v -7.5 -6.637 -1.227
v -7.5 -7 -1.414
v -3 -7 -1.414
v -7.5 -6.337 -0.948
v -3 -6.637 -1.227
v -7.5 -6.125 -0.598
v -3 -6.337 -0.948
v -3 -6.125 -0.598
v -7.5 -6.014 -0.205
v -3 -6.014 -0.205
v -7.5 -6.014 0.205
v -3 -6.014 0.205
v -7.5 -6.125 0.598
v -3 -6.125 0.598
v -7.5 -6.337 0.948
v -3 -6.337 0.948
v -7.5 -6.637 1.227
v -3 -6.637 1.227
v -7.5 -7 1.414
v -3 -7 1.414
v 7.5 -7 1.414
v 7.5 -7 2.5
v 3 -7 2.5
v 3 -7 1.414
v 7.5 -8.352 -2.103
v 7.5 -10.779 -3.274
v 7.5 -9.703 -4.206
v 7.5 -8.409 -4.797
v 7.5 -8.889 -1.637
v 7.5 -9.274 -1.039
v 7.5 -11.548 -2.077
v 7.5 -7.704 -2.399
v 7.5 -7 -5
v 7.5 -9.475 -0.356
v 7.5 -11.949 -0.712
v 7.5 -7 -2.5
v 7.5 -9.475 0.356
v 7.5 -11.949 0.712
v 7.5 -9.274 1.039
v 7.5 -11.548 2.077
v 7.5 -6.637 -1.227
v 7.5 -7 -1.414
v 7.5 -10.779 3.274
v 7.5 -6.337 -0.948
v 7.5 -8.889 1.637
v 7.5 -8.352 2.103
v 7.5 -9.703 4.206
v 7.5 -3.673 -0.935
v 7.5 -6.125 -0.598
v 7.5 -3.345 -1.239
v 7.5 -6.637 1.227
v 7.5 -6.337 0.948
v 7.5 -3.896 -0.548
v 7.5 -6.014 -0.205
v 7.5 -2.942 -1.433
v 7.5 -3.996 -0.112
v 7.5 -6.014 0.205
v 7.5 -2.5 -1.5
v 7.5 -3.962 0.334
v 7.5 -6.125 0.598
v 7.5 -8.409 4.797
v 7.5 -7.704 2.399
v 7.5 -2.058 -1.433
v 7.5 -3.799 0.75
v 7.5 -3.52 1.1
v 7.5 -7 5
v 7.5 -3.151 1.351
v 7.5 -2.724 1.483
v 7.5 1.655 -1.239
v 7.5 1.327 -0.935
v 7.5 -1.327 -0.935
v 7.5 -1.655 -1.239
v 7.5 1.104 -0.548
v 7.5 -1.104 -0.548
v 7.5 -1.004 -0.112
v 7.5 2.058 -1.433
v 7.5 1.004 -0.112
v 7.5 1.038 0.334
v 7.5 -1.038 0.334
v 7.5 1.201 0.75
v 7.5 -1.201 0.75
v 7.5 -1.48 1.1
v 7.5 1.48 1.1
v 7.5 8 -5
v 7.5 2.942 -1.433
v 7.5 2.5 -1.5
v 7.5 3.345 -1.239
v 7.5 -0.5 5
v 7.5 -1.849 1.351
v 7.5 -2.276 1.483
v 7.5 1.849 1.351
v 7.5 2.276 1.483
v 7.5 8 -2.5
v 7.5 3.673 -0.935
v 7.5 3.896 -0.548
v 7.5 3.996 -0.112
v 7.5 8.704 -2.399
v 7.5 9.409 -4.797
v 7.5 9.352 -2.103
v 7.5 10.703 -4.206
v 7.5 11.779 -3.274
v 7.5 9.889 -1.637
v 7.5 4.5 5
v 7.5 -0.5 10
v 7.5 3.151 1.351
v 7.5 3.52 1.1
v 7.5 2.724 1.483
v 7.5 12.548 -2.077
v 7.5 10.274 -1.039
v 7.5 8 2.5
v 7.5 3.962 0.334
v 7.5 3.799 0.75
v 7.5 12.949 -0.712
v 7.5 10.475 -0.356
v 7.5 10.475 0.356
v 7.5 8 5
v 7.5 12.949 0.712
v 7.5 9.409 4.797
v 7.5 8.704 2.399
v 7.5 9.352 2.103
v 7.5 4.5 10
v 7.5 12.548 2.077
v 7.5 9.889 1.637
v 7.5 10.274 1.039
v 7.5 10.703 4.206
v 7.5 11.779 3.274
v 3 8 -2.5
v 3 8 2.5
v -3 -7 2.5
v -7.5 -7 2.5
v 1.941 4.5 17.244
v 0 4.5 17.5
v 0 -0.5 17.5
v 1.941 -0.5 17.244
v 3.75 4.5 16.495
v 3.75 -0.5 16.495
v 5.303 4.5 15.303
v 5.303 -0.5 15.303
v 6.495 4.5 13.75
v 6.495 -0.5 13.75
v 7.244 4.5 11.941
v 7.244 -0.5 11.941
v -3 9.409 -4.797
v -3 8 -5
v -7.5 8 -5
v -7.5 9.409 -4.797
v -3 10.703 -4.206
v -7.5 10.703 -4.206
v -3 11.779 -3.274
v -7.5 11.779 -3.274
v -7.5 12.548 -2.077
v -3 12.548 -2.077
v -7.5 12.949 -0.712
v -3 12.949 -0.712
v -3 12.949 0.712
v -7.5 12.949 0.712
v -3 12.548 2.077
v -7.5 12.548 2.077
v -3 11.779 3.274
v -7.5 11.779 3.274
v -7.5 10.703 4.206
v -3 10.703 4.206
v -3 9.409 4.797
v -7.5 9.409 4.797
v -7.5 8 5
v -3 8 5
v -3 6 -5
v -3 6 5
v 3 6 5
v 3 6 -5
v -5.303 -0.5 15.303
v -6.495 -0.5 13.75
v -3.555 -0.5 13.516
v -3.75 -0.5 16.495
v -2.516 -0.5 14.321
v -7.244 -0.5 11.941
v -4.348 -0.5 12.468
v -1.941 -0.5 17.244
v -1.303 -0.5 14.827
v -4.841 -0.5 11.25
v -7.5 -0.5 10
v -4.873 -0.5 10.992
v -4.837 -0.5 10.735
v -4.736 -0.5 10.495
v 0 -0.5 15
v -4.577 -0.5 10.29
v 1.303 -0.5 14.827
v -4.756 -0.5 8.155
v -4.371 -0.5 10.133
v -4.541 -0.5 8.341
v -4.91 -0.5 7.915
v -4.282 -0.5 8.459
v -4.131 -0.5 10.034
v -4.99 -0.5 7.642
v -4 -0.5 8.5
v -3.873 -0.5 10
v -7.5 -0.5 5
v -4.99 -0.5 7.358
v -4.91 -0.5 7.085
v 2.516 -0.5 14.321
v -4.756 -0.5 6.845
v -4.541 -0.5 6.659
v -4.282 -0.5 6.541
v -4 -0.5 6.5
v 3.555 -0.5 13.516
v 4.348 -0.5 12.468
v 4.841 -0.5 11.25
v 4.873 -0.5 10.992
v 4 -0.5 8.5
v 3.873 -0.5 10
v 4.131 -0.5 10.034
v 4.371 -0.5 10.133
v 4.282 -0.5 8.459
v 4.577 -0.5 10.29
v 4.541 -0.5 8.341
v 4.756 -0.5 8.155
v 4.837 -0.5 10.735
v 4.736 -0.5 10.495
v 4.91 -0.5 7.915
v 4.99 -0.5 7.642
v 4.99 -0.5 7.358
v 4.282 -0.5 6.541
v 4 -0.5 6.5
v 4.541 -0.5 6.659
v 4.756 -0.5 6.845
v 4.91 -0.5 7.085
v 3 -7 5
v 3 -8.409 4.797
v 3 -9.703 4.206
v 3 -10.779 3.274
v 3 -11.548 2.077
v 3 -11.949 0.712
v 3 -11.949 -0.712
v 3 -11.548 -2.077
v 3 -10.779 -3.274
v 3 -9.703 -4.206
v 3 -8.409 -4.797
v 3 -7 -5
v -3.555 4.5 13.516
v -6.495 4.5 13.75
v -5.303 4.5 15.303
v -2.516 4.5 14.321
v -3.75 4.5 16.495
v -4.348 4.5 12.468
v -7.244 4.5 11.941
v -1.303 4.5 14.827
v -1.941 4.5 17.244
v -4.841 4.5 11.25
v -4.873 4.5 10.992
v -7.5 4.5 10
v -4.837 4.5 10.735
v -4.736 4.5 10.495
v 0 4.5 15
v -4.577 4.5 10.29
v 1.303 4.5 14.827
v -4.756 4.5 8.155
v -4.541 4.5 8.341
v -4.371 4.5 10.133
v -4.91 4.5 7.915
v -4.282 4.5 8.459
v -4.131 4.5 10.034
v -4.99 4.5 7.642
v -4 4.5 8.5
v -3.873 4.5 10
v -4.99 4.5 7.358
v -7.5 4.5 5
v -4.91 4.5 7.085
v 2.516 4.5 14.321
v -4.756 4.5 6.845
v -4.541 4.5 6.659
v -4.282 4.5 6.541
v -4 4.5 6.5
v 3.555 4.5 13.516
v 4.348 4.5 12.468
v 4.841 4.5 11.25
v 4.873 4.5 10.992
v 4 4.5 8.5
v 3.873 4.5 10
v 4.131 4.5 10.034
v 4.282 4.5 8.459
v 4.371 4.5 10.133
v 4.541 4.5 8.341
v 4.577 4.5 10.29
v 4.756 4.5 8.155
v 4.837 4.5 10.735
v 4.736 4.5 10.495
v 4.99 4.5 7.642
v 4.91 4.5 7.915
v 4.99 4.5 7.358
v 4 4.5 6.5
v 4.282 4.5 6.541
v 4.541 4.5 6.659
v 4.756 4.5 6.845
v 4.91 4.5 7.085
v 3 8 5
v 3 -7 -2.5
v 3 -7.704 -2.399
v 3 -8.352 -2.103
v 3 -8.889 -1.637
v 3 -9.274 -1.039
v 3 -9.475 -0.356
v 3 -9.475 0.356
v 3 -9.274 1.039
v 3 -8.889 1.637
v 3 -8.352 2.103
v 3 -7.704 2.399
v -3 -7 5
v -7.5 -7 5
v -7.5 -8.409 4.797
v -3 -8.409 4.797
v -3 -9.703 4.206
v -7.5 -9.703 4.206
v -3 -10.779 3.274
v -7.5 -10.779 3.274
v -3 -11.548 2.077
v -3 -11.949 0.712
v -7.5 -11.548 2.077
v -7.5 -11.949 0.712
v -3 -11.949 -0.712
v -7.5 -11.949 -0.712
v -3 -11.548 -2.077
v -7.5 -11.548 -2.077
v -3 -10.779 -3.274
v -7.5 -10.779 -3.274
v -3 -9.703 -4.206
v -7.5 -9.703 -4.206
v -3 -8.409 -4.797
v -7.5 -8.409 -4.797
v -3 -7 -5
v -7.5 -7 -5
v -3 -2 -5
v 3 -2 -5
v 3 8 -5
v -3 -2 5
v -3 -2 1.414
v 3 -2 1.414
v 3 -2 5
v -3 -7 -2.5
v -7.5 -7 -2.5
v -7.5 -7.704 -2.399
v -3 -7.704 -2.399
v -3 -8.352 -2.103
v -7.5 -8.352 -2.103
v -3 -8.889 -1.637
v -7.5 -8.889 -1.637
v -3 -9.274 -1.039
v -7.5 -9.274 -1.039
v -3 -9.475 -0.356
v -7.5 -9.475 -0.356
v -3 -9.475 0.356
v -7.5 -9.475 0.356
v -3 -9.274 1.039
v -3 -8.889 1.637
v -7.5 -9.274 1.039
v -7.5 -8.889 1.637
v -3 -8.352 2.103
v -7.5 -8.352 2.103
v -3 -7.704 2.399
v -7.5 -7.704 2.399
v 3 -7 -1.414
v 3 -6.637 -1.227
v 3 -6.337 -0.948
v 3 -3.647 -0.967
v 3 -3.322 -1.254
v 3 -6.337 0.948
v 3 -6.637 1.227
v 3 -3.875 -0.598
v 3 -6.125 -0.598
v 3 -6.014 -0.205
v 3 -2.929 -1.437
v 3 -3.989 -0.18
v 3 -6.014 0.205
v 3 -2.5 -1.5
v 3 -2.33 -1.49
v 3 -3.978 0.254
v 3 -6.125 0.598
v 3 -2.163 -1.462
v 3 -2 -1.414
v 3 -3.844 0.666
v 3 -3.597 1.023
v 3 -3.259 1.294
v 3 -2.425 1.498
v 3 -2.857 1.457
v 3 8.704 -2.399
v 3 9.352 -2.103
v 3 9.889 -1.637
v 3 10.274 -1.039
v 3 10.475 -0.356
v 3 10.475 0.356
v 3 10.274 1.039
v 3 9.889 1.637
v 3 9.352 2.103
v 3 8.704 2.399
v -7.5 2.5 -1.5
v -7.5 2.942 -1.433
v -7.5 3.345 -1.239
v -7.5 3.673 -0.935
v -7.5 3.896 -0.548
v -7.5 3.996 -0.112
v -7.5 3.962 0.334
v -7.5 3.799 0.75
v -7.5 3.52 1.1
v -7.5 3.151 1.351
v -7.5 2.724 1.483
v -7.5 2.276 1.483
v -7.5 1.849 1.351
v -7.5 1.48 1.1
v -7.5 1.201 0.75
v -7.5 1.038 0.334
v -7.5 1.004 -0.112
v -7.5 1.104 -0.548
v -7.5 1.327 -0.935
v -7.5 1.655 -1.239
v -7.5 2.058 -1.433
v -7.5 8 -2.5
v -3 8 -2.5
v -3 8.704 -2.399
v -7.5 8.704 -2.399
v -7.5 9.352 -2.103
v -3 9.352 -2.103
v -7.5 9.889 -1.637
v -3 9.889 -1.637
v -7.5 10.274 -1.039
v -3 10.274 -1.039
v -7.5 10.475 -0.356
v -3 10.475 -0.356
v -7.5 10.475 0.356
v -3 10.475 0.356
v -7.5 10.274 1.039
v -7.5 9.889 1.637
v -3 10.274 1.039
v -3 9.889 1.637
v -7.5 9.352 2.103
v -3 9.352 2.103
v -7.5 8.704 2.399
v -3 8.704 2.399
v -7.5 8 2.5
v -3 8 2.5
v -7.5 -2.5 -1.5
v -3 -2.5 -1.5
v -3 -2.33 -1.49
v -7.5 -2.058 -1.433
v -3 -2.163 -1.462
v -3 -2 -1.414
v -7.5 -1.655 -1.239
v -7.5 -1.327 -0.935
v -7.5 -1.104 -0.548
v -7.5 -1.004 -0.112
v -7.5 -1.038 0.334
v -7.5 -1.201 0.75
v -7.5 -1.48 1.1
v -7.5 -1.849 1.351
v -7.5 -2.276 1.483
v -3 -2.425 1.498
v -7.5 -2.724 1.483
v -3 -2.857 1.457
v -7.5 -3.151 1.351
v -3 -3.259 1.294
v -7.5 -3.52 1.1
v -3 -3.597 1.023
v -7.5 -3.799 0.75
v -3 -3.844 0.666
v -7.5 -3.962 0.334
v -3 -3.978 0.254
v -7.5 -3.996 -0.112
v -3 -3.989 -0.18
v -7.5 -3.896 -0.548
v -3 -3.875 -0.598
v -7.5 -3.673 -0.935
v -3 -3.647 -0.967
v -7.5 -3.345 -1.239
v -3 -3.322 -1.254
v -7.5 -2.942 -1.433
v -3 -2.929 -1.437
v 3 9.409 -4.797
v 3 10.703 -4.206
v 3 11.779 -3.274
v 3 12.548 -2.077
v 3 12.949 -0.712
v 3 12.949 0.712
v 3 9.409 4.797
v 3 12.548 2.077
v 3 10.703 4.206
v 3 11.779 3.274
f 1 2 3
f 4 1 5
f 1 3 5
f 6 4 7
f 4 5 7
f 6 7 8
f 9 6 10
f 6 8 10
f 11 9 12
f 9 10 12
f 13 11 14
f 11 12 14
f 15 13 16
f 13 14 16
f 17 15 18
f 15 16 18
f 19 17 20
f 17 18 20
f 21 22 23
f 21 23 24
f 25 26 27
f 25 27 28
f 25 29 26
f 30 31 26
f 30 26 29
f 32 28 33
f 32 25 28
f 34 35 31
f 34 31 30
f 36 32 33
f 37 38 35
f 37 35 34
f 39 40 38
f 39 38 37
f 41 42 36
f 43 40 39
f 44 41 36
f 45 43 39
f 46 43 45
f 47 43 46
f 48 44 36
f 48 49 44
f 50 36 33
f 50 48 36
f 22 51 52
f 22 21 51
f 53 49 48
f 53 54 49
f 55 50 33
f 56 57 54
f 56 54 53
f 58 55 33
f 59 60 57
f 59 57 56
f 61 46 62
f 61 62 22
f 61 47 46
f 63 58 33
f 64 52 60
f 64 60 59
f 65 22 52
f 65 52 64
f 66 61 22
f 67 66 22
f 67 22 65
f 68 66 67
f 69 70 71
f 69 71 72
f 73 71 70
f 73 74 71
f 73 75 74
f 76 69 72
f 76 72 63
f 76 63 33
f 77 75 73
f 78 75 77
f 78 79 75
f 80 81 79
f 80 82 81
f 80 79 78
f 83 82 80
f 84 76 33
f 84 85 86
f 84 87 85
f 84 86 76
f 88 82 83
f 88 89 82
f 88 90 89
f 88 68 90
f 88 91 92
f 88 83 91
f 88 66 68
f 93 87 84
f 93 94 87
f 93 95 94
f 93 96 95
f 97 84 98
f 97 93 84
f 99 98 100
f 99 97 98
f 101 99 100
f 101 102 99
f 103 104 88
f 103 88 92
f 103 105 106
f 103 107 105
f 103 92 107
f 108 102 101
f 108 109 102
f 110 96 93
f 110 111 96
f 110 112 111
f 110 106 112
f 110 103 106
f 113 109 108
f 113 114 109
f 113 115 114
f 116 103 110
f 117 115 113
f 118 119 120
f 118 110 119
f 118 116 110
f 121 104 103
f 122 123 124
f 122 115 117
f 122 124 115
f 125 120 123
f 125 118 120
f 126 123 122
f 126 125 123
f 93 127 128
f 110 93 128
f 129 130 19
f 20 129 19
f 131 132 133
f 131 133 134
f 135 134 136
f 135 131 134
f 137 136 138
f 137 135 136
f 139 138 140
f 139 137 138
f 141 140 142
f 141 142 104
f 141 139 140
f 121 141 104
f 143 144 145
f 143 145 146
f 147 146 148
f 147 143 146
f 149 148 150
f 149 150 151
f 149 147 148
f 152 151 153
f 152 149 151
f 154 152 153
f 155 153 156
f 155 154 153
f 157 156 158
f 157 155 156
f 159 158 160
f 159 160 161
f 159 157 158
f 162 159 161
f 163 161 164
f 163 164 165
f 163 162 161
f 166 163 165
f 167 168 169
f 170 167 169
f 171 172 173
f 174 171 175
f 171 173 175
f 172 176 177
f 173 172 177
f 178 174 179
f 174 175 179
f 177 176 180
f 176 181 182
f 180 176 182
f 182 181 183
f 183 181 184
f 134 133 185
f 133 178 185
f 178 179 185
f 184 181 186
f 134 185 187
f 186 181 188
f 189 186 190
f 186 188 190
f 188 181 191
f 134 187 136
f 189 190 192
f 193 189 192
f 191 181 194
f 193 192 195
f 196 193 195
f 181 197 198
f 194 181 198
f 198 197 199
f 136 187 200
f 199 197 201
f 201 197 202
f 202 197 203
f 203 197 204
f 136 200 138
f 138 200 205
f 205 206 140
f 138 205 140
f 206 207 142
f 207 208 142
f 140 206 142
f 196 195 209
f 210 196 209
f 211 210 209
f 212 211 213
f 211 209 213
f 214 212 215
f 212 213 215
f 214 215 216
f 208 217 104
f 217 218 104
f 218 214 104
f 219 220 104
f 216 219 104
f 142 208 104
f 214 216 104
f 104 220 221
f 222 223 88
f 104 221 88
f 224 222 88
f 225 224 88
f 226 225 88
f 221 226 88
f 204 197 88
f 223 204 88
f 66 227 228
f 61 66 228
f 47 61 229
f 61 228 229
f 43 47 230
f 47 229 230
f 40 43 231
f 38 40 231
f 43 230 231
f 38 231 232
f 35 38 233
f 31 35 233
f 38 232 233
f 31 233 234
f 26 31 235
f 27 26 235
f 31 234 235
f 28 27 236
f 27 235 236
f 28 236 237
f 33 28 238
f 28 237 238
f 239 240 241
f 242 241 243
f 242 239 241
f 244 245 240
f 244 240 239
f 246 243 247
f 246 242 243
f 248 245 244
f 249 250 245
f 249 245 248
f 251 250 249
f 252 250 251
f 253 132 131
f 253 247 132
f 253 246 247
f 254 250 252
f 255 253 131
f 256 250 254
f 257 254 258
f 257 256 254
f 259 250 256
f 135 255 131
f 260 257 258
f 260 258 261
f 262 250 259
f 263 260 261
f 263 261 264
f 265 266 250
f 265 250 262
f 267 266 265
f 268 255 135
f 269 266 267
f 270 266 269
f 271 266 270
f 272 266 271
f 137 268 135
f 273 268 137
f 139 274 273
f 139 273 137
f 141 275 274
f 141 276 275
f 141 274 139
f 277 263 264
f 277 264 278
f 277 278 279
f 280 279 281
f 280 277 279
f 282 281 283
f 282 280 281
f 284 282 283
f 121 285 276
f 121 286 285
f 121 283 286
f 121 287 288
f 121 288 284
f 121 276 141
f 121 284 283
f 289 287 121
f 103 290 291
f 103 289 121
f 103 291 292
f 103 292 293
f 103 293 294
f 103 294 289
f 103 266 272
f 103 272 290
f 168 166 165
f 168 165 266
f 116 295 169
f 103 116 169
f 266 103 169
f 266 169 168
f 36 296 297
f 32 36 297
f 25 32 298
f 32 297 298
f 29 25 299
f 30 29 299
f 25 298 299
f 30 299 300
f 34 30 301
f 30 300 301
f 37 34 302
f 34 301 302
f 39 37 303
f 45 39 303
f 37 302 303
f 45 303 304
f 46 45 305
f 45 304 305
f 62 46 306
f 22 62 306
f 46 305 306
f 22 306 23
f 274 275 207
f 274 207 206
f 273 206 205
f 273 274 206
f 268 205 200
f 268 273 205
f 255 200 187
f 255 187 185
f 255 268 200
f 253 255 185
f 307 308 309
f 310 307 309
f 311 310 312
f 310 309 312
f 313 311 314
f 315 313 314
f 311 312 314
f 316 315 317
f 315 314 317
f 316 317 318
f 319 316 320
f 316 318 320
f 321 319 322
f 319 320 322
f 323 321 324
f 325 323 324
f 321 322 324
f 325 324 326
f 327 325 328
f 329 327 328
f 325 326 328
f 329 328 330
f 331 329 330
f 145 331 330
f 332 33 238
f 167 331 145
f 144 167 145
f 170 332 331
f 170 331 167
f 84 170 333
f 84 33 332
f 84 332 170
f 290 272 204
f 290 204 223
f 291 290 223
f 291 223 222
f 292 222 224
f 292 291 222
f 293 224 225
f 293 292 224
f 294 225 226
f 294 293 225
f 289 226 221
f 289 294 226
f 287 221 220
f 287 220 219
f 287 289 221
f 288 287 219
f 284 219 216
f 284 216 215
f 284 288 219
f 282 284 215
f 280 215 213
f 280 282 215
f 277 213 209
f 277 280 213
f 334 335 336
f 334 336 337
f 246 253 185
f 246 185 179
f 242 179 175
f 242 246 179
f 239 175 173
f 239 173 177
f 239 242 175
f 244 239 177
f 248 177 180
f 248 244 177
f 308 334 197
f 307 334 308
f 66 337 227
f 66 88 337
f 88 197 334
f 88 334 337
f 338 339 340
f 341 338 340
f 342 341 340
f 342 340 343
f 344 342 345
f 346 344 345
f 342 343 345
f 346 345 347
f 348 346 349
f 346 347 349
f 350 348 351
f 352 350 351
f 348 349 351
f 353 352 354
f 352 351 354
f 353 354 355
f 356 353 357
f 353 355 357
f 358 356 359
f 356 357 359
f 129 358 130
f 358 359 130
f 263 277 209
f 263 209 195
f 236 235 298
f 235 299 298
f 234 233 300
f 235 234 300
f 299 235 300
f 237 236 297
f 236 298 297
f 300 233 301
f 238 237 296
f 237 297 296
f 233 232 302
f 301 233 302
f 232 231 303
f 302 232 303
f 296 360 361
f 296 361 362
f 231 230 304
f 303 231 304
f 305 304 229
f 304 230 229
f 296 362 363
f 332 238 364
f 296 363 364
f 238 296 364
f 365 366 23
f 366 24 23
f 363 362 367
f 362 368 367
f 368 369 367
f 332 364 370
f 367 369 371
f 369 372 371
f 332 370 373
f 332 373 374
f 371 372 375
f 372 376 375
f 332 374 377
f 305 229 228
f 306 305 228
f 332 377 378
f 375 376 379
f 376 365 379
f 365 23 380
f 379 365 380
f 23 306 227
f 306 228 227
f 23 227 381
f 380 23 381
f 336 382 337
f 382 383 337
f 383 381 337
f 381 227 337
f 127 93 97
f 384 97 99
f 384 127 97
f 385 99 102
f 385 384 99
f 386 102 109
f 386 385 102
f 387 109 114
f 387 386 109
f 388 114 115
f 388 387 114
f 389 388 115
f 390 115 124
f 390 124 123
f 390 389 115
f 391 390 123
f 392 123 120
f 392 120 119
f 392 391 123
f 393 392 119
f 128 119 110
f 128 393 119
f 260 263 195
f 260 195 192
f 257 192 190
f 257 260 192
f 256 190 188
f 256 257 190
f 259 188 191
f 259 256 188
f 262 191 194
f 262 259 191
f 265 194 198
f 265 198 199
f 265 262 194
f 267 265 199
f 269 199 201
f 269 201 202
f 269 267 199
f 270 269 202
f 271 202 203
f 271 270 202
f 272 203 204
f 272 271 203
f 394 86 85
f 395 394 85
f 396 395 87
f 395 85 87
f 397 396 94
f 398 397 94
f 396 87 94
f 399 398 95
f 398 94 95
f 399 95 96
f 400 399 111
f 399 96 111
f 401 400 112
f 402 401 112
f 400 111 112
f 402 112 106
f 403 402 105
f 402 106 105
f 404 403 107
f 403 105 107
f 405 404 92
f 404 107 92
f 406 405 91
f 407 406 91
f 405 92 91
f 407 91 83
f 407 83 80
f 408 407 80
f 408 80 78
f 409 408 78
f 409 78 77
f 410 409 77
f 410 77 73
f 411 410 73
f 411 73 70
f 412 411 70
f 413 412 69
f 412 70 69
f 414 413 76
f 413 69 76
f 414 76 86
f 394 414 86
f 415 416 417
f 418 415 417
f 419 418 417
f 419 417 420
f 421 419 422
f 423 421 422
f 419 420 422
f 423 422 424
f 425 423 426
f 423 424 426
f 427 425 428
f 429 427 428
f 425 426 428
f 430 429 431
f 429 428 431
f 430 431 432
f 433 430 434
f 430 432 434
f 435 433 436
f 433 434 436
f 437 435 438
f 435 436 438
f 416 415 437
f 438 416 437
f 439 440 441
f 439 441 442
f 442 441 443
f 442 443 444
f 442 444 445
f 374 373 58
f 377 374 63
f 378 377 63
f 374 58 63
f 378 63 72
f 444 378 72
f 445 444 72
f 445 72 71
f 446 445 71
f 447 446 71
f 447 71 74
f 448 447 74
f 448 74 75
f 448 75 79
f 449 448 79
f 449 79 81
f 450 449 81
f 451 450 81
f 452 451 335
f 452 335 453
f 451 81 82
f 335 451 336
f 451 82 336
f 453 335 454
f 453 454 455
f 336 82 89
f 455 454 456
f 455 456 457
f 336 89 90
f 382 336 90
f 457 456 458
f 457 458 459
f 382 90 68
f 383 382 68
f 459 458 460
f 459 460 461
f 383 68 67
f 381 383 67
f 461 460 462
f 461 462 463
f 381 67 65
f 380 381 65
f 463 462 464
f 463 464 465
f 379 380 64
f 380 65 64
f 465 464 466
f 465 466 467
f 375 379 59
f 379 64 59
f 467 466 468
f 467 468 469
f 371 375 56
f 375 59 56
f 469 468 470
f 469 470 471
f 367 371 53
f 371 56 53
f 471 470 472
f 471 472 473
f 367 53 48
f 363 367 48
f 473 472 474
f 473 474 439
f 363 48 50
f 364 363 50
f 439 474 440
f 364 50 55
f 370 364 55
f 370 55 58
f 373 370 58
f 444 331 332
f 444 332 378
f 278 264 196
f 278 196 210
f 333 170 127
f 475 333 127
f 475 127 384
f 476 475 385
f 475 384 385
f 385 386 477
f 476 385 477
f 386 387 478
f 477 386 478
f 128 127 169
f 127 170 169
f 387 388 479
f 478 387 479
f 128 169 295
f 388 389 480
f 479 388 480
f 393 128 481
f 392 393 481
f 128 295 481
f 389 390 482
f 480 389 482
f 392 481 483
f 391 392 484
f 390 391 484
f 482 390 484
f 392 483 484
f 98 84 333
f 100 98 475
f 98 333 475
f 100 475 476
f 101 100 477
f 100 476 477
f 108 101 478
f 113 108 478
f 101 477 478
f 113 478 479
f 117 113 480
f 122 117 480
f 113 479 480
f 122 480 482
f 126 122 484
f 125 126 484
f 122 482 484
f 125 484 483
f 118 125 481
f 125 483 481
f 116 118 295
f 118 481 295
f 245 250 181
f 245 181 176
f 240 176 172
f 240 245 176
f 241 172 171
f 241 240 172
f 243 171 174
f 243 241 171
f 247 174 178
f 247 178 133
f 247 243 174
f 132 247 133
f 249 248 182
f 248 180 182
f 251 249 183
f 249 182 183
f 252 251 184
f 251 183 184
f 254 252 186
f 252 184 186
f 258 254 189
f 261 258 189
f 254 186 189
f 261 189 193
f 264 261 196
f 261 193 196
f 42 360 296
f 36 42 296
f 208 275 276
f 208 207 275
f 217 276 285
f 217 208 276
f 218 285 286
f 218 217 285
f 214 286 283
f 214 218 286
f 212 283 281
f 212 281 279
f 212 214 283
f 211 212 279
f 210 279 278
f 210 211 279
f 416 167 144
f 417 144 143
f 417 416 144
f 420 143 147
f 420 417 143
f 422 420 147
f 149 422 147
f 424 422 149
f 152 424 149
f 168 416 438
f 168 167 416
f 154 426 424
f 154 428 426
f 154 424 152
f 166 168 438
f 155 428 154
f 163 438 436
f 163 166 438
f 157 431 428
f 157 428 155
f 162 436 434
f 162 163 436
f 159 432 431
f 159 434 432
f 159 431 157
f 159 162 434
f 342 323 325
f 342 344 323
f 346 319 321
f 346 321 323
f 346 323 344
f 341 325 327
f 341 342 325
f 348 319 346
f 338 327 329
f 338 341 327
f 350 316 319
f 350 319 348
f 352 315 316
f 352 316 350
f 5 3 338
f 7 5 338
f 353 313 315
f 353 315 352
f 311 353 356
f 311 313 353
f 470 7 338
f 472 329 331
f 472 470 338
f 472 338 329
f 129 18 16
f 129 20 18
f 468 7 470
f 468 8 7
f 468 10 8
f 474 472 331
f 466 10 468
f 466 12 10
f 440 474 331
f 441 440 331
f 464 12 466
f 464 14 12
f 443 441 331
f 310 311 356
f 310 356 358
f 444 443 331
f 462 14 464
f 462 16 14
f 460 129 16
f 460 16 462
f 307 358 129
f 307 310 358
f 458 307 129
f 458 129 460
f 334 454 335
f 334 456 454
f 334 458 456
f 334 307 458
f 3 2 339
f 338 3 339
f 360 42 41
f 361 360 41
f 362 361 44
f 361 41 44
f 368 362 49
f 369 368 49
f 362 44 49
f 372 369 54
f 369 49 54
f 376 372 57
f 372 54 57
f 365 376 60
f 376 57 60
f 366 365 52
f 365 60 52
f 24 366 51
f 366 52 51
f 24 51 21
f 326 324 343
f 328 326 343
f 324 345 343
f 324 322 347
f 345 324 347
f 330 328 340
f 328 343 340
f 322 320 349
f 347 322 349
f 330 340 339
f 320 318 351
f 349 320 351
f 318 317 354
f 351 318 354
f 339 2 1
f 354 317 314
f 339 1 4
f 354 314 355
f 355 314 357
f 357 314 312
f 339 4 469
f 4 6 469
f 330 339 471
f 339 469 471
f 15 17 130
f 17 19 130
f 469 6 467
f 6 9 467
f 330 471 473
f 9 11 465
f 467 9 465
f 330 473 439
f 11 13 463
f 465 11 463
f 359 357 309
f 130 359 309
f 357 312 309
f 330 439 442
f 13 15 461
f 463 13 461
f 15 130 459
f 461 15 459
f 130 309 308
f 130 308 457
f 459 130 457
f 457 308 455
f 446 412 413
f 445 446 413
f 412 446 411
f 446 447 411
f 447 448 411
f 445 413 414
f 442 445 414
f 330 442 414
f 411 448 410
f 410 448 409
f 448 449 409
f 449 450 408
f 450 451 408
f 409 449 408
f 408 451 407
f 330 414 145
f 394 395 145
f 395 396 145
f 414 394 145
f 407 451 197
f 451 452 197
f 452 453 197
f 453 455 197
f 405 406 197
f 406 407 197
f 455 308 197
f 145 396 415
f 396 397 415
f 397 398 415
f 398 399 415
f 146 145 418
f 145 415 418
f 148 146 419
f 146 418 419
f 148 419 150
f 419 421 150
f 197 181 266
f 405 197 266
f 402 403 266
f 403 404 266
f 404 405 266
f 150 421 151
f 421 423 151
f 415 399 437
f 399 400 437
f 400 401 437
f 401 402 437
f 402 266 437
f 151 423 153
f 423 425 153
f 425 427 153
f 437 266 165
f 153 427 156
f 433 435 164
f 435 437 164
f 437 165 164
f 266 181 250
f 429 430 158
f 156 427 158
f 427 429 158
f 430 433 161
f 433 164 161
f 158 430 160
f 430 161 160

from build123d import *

# Parameters (mm, degrees)
SKETCH2_R           = 2.5
BOSS_EXTRUDE2_DEPTH = 7.5
SKETCH3_W           = 6
SKETCH3_H           = 10
CUT_EXTRUDE1_DEPTH  = 7.5
SKETCH4_R           = 1.5
CUT_EXTRUDE2_DEPTH  = 15
SKETCH6_W           = 6
SKETCH6_H           = 2
CUT_EXTRUDE3_DEPTH  = 15
SKETCH7_W           = 15
SKETCH7_H           = 5
BOSS_EXTRUDE3_DEPTH = 5
BOSS_EXTRUDE4_DEPTH = 5
FILLET1_R           = 1
CUT_EXTRUDE4_DEPTH  = 5


with BuildPart() as part:
    # Sketch2 → Boss-Extrude2 (new, symmetric)
    with BuildSketch(Plane(origin=(0, 0, 0), x_dir=(0, 0, -1), z_dir=(1, 0, 0))):
        with BuildLine():
            Line((-5, 8), (-5, -7))
            Line((-5, -7), (5, -7))
            Line((5, -7), (5, 8))
            ThreePointArc((5, 8), (0, 13), (-5, 8))
        make_face()
        with Locations((0, 8)):
            Circle(SKETCH2_R, mode=Mode.SUBTRACT)
    boss_extrude2 = extrude(amount=BOSS_EXTRUDE2_DEPTH, both=True)

    # Sketch3 → Cut-Extrude1 (cut, symmetric)
    with BuildSketch(Plane.XY):
        with Locations((0, 8)):
            Rectangle(SKETCH3_W, SKETCH3_H)
    cut_extrude1 = extrude(amount=CUT_EXTRUDE1_DEPTH, both=True, mode=Mode.SUBTRACT)

    # Mirror1: Boss-Extrude2, Cut-Extrude1 across plane
    add(boss_extrude2.mirror(Plane(origin=(0, 0.5, 0), x_dir=(0, 0, 1), z_dir=(0, -1, 0))))
    add(cut_extrude1.mirror(Plane(origin=(0, 0.5, 0), x_dir=(0, 0, 1), z_dir=(0, -1, 0))), mode=Mode.SUBTRACT)

    # Sketch4 → Cut-Extrude2 (cut)
    with BuildSketch(Plane(origin=(7.5, 0, 0), x_dir=(0, 0, -1), z_dir=(1, 0, 0))):
        with Locations((0, 2.5)):
            Circle(SKETCH4_R)
        with Locations((0, -2.5)):
            Circle(SKETCH4_R)
        with Locations((0, -7.5)):
            Circle(SKETCH4_R)
    extrude(amount=-CUT_EXTRUDE2_DEPTH, mode=Mode.SUBTRACT)

    # Sketch6 → Cut-Extrude3 (cut)
    with BuildSketch(Plane.XY.offset(5)):
        with Locations((0, 7)):
            Rectangle(SKETCH6_W, SKETCH6_H)
    extrude(amount=-CUT_EXTRUDE3_DEPTH, mode=Mode.SUBTRACT)

    # Sketch7 → Boss-Extrude3 (add)
    with BuildSketch(Plane.XY.offset(5)):
        with Locations((0, 2)):
            Rectangle(SKETCH7_W, SKETCH7_H)
    extrude(amount=BOSS_EXTRUDE3_DEPTH)

    # Sketch8 → Boss-Extrude4 (add)
    with BuildSketch(Plane(origin=(0, 4.5, 0), x_dir=(1, 0, 0), z_dir=(0, 1, 0))):
        with BuildLine():
            ThreePointArc((5, -10), (0, -15), (-5, -10))
            Line((-5, -10), (-7.5, -10))
            ThreePointArc((-7.5, -10), (0, -17.5), (7.5, -10))
            Line((7.5, -10), (5, -10))
        make_face()
    extrude(amount=-BOSS_EXTRUDE4_DEPTH)

    # Fillet1
    fillet1_edges = [part.edges().sort_by_distance(p)[0] for p in [
        (-5, 2, 10),
        (5, 2, 10),
    ]]
    fillet(fillet1_edges, radius=FILLET1_R)

    # Sketch9 → Cut-Extrude4 (cut)
    with BuildSketch(Plane(origin=(0, 4.5, 0), x_dir=(1, 0, 0), z_dir=(0, 1, 0))):
        with BuildLine():
            Line((-4, -6.5), (4, -6.5))
            ThreePointArc((4, -6.5), (5, -7.5), (4, -8.5))
            Line((4, -8.5), (-4, -8.5))
            ThreePointArc((-4, -8.5), (-5, -7.5), (-4, -6.5))
        make_face()
    extrude(amount=-CUT_EXTRUDE4_DEPTH, mode=Mode.SUBTRACT)


solid = part.part
